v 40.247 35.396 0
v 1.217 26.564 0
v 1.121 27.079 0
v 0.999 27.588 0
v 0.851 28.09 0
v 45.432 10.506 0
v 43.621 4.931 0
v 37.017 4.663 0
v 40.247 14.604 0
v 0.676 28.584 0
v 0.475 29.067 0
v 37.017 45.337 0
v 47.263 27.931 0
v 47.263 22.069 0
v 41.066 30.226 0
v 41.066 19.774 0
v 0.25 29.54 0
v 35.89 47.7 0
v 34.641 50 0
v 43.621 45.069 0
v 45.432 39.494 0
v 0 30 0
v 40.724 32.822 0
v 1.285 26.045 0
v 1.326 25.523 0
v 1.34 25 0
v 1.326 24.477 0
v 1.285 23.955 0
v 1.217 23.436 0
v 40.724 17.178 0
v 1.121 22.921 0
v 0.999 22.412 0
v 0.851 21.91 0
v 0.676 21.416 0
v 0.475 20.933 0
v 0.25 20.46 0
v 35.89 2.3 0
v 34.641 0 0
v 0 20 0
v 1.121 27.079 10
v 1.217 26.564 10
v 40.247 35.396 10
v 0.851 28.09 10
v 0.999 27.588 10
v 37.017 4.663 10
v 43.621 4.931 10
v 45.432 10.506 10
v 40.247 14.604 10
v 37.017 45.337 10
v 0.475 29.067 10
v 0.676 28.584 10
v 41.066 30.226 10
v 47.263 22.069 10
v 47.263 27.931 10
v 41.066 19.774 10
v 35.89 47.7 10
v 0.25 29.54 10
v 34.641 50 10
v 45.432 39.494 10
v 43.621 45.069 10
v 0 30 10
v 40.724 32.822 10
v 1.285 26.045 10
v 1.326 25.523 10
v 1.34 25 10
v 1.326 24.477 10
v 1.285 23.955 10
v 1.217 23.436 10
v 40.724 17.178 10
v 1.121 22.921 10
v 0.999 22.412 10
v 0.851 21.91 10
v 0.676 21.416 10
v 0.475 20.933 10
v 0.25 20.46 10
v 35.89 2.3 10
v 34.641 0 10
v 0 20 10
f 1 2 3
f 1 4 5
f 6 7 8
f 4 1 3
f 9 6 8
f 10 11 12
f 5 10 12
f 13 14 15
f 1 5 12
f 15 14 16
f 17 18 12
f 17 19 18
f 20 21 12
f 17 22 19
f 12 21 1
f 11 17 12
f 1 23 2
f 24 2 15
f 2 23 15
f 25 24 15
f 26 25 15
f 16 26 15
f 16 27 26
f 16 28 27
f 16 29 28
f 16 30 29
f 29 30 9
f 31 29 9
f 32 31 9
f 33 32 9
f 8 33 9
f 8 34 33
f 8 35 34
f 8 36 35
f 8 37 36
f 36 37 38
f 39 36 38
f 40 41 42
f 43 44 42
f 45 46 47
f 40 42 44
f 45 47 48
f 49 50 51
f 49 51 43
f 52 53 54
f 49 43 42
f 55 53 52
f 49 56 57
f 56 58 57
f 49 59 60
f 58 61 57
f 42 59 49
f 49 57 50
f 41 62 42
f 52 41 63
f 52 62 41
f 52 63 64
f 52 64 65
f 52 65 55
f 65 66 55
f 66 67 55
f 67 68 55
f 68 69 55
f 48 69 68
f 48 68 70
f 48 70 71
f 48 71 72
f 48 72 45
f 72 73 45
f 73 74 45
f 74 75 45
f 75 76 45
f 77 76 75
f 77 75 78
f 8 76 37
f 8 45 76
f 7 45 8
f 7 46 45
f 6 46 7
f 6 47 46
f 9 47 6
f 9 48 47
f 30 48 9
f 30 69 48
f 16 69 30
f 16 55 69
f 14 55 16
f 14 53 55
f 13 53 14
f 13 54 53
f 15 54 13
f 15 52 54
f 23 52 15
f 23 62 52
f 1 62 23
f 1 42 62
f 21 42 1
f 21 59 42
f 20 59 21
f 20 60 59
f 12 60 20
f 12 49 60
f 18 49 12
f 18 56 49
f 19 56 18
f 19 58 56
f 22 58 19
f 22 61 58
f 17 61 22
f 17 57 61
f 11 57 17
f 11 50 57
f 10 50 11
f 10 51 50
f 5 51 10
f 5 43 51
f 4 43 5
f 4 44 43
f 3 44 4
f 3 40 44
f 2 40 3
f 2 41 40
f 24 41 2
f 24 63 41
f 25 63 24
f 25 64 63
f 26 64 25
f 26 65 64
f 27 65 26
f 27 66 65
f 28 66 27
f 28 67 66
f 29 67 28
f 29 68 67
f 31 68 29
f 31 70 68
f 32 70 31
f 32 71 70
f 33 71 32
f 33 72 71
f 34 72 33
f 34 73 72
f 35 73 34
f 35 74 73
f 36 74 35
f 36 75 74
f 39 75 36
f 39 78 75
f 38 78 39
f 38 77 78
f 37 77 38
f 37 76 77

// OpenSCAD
$fn = 32;

// ----------------------------------------------------------------------
// Gear sector: 3 teeth on 60 degrees
// ----------------------------------------------------------------------

// --- parameters (mm) ---
sector_angle = 60;        // sector angle, degrees
root_r = 50;              // root circle radius
tooth_h = 6;              // tooth height over the root circle
teeth = 3;                // number of teeth on the sector
hub_r = 10;               // hub bore radius
plate_t = 10;             // sector thickness, Z
arc_step = 3;             // sampling step of the root/hub arcs, degrees

tip_r = root_r + tooth_h;  // tip circle radius

profile = [[34.641, 0], [35.89, 2.3], [37.017, 4.663], [43.621, 4.931], [45.432, 10.506], [40.247, 14.604], [40.724, 17.178], [41.066, 19.774], [47.263, 22.069], [47.263, 27.931], [41.066, 30.226], [40.724, 32.822], [40.247, 35.396], [45.432, 39.494], [43.621, 45.069], [37.017, 45.337], [35.89, 47.7], [34.641, 50], [0, 30], [0.25, 29.54], [0.475, 29.067], [0.676, 28.584], [0.851, 28.09], [0.999, 27.588], [1.121, 27.079], [1.217, 26.564], [1.285, 26.045], [1.326, 25.523], [1.34, 25], [1.326, 24.477], [1.285, 23.955], [1.217, 23.436], [1.121, 22.921], [0.999, 22.412], [0.851, 21.91], [0.676, 21.416], [0.475, 20.933], [0.25, 20.46], [0, 20]];  // primary outline, 39 points, counter clockwise

// --- the one profile operation ---
linear_extrude(height = plate_t) polygon(points = profile);
